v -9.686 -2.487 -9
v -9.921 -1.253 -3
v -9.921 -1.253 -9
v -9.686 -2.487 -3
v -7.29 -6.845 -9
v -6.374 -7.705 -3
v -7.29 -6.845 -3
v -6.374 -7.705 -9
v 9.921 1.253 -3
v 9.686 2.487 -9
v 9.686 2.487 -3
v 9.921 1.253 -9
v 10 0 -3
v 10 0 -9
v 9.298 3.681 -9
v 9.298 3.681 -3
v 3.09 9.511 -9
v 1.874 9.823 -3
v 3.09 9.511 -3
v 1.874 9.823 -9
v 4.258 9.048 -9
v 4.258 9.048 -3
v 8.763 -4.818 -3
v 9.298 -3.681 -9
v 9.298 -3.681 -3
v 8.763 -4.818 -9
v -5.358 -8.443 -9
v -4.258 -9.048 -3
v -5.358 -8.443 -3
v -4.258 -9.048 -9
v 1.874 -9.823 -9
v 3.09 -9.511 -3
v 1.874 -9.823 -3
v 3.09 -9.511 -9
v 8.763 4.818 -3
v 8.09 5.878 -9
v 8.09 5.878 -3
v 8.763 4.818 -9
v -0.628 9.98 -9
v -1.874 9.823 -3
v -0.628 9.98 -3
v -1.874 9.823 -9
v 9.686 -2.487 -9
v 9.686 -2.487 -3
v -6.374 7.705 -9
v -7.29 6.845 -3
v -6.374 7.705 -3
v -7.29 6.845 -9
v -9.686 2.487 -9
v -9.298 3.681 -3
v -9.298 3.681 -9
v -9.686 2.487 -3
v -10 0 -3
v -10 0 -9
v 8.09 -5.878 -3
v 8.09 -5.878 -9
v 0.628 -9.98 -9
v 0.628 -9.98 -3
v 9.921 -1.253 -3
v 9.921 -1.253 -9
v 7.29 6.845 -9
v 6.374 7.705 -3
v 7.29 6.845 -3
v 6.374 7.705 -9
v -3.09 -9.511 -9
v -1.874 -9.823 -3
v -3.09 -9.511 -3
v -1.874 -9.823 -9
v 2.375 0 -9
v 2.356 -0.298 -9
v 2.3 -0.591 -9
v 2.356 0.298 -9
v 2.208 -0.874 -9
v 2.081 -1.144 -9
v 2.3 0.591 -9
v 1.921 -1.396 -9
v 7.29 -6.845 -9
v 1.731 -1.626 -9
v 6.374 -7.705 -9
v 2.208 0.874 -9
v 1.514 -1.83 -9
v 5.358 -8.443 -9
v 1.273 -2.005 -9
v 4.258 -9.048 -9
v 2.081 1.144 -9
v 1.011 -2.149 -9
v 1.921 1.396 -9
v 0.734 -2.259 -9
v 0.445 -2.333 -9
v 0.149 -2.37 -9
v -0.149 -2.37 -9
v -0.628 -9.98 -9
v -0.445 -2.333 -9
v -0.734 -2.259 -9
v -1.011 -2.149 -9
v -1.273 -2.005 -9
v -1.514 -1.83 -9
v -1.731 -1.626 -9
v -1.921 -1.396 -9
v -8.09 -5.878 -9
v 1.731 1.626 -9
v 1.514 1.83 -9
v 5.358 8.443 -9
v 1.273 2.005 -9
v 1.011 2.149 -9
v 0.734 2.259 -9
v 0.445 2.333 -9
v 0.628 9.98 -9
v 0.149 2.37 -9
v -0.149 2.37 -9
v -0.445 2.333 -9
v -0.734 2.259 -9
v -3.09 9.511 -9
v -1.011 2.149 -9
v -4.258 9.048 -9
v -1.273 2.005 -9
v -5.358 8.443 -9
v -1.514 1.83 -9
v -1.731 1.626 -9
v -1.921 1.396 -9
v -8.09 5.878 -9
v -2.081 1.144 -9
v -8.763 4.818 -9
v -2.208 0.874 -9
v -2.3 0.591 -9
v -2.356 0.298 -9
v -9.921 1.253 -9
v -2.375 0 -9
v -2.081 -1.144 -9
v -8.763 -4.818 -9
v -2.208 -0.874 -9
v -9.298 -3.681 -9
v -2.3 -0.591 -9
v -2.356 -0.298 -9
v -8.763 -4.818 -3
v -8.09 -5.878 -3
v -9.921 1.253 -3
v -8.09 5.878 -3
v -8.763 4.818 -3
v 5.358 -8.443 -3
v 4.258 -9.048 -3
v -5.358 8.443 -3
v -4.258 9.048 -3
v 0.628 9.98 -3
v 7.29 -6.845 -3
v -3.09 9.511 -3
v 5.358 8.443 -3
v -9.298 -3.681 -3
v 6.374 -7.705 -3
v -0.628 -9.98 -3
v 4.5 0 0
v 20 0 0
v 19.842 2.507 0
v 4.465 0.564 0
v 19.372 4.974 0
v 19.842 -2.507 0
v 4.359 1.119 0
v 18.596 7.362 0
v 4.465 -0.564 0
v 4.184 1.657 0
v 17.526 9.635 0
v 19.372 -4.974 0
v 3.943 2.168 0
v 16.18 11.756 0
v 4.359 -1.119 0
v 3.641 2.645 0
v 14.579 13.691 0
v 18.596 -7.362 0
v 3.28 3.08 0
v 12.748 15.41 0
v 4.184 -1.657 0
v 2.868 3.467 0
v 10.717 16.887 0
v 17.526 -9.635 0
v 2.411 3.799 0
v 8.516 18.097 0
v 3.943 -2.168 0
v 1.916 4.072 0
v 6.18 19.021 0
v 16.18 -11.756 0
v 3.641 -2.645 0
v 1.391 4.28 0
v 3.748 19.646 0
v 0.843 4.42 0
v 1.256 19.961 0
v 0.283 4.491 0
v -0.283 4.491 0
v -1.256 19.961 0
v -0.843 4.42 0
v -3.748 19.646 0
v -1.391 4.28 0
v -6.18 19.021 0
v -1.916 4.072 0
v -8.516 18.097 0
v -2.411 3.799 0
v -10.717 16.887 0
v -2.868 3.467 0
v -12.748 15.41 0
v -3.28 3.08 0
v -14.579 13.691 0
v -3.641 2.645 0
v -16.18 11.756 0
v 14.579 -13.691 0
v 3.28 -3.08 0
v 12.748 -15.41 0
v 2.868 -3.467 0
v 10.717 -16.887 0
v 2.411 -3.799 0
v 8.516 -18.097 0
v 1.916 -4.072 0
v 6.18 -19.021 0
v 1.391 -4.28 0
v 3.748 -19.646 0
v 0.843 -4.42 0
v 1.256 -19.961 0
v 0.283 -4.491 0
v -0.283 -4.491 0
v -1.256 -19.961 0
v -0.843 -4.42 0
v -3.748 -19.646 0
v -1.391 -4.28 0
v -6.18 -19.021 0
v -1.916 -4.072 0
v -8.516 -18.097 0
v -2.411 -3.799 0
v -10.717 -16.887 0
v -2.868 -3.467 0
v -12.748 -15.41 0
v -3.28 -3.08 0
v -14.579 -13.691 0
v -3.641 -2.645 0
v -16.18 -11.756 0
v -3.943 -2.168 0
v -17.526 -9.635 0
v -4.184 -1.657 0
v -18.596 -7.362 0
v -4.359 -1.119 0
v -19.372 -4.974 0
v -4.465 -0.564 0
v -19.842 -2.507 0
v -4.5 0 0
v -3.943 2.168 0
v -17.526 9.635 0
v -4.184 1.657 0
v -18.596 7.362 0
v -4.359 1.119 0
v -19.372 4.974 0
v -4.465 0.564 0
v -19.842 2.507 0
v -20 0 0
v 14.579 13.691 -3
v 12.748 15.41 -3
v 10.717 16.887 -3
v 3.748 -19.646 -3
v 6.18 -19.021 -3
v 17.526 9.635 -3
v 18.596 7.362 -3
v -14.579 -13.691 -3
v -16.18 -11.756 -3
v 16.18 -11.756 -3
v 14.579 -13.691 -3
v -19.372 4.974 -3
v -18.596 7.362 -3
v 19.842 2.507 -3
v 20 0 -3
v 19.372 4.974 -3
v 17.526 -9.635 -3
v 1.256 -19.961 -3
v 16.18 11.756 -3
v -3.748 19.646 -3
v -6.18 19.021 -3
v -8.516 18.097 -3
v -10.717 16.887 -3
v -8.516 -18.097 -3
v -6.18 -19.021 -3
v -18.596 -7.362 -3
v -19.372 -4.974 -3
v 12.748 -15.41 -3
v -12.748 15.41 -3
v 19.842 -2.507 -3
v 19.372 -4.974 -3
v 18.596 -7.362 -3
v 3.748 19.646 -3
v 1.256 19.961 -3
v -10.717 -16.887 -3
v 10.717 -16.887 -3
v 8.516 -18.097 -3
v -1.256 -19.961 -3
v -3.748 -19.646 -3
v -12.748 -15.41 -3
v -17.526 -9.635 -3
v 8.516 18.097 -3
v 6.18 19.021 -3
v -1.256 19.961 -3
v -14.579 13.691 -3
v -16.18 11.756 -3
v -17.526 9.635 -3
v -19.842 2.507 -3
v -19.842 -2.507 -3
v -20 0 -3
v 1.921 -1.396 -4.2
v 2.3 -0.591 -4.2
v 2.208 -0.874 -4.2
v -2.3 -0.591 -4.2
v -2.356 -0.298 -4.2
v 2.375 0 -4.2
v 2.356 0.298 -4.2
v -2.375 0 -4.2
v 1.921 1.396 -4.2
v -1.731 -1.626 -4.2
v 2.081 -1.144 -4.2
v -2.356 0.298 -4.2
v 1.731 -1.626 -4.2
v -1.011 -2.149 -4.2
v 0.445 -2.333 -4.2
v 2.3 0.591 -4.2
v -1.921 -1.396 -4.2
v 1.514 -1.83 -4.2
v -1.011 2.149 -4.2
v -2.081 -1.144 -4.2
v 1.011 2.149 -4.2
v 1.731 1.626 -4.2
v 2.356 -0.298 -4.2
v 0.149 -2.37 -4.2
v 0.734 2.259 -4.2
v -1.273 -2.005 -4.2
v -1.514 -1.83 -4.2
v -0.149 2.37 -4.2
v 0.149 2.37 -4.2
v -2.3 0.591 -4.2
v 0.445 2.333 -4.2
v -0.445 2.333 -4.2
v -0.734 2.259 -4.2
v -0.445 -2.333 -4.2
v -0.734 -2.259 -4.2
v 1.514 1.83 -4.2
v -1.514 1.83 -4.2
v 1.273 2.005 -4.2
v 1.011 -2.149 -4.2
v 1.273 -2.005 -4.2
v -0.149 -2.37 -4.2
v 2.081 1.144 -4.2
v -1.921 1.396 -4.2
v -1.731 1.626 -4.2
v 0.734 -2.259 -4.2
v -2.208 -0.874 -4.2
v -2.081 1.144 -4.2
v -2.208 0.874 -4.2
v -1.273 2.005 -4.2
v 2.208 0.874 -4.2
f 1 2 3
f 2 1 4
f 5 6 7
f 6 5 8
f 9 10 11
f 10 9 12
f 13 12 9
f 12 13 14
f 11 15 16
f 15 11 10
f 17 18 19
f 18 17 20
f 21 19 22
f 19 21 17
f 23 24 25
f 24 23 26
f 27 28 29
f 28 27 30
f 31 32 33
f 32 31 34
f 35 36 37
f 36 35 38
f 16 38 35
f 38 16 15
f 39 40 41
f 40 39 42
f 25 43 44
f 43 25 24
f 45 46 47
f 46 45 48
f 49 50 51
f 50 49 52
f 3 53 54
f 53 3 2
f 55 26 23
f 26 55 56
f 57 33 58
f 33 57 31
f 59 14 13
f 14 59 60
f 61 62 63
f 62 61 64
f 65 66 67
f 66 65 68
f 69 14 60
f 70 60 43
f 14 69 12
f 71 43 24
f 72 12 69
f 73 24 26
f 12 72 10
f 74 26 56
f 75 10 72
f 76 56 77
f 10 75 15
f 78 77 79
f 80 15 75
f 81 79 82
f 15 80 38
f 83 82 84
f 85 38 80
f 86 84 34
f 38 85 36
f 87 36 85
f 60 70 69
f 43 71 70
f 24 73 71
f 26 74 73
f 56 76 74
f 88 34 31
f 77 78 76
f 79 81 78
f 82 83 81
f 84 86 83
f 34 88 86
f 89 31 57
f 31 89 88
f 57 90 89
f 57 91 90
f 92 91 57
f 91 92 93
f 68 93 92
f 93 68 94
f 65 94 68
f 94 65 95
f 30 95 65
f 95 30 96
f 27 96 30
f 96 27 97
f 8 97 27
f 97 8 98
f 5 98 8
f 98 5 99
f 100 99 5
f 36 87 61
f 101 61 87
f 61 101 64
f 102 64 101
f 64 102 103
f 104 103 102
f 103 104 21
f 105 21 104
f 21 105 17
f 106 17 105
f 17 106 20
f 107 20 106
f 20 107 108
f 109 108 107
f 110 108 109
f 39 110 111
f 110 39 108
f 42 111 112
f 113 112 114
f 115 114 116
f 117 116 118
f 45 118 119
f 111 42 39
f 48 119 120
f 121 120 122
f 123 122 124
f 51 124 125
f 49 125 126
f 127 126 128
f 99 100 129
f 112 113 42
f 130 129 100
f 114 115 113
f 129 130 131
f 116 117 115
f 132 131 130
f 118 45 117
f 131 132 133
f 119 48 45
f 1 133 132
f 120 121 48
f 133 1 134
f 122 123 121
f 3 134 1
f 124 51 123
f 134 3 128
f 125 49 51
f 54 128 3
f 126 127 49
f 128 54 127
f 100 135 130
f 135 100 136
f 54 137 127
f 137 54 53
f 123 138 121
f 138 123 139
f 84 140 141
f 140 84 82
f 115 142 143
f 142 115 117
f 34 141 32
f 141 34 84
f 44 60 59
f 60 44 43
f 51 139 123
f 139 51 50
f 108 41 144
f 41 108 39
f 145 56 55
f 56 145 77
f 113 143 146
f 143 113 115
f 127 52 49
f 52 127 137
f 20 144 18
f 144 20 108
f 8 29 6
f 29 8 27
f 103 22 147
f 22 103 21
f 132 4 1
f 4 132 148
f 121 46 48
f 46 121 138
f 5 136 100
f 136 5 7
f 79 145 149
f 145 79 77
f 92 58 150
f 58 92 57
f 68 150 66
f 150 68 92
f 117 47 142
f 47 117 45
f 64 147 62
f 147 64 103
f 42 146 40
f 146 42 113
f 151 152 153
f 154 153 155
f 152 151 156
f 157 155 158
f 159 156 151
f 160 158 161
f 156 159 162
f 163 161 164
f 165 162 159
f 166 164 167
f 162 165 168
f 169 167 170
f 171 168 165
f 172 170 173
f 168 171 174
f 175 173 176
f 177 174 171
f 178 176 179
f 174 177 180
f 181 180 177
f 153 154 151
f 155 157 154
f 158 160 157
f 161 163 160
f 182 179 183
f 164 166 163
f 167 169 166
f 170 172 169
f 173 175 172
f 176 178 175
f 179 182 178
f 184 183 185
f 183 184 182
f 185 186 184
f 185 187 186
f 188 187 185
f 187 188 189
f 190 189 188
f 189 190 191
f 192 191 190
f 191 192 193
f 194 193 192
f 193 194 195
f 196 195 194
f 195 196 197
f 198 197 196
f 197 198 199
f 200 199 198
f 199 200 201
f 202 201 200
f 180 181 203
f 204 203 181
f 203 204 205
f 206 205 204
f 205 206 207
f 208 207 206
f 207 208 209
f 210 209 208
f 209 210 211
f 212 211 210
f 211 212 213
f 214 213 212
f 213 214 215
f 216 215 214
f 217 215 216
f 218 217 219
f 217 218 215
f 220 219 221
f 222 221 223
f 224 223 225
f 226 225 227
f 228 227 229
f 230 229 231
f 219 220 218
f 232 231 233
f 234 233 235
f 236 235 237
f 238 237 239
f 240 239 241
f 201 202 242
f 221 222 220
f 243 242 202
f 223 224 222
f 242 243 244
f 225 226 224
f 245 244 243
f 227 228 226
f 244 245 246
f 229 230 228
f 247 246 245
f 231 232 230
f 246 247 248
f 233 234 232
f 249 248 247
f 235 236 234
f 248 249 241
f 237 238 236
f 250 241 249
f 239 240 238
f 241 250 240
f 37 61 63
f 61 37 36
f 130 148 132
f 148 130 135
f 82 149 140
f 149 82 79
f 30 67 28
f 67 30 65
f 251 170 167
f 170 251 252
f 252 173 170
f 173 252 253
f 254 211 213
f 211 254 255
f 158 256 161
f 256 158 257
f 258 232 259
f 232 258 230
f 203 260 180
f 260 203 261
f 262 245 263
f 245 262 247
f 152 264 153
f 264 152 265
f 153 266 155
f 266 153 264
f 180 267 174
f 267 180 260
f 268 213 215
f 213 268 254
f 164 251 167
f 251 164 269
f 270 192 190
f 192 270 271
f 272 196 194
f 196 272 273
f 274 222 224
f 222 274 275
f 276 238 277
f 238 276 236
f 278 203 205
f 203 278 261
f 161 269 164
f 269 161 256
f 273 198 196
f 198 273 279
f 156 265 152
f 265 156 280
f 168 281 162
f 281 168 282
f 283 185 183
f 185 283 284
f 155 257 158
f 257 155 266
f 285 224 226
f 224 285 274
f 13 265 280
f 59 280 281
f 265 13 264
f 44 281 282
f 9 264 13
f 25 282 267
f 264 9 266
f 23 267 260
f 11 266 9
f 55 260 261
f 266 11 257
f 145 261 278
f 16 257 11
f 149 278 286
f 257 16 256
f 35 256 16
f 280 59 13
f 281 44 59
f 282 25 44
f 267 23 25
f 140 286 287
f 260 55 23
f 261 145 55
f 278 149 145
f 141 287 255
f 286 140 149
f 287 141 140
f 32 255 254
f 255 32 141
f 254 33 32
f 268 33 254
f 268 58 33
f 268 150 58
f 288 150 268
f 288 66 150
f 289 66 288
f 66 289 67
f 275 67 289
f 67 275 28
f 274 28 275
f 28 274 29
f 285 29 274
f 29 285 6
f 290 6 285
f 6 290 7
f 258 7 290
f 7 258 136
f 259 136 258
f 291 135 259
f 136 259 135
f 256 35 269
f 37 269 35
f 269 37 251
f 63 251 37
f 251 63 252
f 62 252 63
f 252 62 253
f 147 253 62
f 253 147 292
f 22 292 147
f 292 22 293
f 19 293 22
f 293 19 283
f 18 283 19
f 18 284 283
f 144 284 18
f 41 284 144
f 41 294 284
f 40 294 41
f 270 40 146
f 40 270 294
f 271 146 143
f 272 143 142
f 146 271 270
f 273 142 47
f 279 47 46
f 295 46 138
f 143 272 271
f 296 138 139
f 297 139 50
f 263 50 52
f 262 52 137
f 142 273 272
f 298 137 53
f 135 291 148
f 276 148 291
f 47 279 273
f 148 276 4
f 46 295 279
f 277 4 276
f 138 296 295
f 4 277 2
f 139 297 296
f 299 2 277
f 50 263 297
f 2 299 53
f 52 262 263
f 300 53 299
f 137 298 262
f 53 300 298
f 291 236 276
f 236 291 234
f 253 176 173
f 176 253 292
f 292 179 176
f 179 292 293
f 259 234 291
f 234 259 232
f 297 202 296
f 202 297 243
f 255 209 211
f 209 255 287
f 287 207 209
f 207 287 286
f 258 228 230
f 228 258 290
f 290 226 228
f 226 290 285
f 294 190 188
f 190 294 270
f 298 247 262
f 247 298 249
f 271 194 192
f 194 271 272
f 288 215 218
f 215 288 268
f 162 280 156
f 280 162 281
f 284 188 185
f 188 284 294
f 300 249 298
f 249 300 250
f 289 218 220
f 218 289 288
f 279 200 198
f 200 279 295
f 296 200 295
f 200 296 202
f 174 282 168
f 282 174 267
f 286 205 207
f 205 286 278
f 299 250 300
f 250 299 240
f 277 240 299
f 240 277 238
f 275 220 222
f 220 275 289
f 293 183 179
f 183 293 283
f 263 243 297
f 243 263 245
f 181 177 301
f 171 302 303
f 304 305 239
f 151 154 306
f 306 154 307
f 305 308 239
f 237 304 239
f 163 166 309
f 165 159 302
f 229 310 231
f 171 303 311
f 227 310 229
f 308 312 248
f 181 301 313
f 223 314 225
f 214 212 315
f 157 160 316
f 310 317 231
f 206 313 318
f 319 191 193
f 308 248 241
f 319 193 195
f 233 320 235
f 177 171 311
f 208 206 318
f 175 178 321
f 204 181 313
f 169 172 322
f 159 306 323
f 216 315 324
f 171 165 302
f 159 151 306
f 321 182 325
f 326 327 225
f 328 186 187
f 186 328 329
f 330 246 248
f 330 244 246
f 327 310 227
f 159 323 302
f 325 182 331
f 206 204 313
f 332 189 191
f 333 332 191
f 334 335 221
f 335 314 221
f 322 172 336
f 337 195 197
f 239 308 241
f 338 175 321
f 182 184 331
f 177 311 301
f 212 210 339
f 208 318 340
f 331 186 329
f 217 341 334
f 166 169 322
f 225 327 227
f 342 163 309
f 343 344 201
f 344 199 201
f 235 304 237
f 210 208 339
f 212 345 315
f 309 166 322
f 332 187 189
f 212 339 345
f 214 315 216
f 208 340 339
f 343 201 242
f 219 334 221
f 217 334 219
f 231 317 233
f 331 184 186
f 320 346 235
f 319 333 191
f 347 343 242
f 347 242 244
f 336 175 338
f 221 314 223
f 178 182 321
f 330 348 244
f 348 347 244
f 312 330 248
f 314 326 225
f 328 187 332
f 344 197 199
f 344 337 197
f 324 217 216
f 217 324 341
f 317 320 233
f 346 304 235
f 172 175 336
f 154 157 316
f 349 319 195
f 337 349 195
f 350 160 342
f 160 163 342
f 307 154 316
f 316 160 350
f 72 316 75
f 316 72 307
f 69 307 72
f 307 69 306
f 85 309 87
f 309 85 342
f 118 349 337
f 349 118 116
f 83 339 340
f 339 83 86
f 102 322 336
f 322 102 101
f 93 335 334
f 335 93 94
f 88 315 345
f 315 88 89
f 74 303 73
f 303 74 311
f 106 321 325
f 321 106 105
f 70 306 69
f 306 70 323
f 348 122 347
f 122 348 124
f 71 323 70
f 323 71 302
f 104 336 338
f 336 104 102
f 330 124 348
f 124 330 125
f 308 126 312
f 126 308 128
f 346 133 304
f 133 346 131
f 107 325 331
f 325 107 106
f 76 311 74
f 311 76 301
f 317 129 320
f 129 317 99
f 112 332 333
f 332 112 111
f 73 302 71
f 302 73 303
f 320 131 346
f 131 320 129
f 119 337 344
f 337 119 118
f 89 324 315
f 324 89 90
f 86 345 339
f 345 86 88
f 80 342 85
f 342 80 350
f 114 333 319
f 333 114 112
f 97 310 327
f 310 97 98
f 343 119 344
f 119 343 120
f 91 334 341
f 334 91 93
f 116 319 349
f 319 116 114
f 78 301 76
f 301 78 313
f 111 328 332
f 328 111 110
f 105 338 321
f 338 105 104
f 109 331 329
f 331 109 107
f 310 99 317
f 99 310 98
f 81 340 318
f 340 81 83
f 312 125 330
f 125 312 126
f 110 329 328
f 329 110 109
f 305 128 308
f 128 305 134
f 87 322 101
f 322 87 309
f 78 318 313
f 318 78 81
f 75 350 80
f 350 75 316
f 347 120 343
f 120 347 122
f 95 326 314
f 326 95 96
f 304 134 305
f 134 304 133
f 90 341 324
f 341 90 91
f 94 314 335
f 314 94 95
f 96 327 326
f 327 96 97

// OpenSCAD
$fn = 50;


difference() {
	union() {
		translate(v = [0, 0, -9.0000000000]) {
			cylinder(h = 9, r = 10.0000000000);
		}
		translate(v = [0, 0, -3.0000000000]) {
			cylinder(h = 3, r = 20.0000000000);
		}
	}
	union() {
		translate(v = [0, 0, 0]) {
			rotate(a = [0, 0, 0]) {
				difference() {
					union() {
						#translate(v = [0, 0, -9.0000000000]) {
							cylinder(h = 9, r = 2.2500000000);
						}
						#translate(v = [0, 0, -4.2000000000]) {
							cylinder(h = 4.2000000000, r1 = 2.3750000000, r2 = 4.5000000000);
						}
						#translate(v = [0, 0, -9.0000000000]) {
							cylinder(h = 9, r = 2.3750000000);
						}
						#translate(v = [0, 0, -9.0000000000]) {
							cylinder(h = 9, r = 2.2500000000);
						}
					}
					union();
				}
			}
		}
	}
}
